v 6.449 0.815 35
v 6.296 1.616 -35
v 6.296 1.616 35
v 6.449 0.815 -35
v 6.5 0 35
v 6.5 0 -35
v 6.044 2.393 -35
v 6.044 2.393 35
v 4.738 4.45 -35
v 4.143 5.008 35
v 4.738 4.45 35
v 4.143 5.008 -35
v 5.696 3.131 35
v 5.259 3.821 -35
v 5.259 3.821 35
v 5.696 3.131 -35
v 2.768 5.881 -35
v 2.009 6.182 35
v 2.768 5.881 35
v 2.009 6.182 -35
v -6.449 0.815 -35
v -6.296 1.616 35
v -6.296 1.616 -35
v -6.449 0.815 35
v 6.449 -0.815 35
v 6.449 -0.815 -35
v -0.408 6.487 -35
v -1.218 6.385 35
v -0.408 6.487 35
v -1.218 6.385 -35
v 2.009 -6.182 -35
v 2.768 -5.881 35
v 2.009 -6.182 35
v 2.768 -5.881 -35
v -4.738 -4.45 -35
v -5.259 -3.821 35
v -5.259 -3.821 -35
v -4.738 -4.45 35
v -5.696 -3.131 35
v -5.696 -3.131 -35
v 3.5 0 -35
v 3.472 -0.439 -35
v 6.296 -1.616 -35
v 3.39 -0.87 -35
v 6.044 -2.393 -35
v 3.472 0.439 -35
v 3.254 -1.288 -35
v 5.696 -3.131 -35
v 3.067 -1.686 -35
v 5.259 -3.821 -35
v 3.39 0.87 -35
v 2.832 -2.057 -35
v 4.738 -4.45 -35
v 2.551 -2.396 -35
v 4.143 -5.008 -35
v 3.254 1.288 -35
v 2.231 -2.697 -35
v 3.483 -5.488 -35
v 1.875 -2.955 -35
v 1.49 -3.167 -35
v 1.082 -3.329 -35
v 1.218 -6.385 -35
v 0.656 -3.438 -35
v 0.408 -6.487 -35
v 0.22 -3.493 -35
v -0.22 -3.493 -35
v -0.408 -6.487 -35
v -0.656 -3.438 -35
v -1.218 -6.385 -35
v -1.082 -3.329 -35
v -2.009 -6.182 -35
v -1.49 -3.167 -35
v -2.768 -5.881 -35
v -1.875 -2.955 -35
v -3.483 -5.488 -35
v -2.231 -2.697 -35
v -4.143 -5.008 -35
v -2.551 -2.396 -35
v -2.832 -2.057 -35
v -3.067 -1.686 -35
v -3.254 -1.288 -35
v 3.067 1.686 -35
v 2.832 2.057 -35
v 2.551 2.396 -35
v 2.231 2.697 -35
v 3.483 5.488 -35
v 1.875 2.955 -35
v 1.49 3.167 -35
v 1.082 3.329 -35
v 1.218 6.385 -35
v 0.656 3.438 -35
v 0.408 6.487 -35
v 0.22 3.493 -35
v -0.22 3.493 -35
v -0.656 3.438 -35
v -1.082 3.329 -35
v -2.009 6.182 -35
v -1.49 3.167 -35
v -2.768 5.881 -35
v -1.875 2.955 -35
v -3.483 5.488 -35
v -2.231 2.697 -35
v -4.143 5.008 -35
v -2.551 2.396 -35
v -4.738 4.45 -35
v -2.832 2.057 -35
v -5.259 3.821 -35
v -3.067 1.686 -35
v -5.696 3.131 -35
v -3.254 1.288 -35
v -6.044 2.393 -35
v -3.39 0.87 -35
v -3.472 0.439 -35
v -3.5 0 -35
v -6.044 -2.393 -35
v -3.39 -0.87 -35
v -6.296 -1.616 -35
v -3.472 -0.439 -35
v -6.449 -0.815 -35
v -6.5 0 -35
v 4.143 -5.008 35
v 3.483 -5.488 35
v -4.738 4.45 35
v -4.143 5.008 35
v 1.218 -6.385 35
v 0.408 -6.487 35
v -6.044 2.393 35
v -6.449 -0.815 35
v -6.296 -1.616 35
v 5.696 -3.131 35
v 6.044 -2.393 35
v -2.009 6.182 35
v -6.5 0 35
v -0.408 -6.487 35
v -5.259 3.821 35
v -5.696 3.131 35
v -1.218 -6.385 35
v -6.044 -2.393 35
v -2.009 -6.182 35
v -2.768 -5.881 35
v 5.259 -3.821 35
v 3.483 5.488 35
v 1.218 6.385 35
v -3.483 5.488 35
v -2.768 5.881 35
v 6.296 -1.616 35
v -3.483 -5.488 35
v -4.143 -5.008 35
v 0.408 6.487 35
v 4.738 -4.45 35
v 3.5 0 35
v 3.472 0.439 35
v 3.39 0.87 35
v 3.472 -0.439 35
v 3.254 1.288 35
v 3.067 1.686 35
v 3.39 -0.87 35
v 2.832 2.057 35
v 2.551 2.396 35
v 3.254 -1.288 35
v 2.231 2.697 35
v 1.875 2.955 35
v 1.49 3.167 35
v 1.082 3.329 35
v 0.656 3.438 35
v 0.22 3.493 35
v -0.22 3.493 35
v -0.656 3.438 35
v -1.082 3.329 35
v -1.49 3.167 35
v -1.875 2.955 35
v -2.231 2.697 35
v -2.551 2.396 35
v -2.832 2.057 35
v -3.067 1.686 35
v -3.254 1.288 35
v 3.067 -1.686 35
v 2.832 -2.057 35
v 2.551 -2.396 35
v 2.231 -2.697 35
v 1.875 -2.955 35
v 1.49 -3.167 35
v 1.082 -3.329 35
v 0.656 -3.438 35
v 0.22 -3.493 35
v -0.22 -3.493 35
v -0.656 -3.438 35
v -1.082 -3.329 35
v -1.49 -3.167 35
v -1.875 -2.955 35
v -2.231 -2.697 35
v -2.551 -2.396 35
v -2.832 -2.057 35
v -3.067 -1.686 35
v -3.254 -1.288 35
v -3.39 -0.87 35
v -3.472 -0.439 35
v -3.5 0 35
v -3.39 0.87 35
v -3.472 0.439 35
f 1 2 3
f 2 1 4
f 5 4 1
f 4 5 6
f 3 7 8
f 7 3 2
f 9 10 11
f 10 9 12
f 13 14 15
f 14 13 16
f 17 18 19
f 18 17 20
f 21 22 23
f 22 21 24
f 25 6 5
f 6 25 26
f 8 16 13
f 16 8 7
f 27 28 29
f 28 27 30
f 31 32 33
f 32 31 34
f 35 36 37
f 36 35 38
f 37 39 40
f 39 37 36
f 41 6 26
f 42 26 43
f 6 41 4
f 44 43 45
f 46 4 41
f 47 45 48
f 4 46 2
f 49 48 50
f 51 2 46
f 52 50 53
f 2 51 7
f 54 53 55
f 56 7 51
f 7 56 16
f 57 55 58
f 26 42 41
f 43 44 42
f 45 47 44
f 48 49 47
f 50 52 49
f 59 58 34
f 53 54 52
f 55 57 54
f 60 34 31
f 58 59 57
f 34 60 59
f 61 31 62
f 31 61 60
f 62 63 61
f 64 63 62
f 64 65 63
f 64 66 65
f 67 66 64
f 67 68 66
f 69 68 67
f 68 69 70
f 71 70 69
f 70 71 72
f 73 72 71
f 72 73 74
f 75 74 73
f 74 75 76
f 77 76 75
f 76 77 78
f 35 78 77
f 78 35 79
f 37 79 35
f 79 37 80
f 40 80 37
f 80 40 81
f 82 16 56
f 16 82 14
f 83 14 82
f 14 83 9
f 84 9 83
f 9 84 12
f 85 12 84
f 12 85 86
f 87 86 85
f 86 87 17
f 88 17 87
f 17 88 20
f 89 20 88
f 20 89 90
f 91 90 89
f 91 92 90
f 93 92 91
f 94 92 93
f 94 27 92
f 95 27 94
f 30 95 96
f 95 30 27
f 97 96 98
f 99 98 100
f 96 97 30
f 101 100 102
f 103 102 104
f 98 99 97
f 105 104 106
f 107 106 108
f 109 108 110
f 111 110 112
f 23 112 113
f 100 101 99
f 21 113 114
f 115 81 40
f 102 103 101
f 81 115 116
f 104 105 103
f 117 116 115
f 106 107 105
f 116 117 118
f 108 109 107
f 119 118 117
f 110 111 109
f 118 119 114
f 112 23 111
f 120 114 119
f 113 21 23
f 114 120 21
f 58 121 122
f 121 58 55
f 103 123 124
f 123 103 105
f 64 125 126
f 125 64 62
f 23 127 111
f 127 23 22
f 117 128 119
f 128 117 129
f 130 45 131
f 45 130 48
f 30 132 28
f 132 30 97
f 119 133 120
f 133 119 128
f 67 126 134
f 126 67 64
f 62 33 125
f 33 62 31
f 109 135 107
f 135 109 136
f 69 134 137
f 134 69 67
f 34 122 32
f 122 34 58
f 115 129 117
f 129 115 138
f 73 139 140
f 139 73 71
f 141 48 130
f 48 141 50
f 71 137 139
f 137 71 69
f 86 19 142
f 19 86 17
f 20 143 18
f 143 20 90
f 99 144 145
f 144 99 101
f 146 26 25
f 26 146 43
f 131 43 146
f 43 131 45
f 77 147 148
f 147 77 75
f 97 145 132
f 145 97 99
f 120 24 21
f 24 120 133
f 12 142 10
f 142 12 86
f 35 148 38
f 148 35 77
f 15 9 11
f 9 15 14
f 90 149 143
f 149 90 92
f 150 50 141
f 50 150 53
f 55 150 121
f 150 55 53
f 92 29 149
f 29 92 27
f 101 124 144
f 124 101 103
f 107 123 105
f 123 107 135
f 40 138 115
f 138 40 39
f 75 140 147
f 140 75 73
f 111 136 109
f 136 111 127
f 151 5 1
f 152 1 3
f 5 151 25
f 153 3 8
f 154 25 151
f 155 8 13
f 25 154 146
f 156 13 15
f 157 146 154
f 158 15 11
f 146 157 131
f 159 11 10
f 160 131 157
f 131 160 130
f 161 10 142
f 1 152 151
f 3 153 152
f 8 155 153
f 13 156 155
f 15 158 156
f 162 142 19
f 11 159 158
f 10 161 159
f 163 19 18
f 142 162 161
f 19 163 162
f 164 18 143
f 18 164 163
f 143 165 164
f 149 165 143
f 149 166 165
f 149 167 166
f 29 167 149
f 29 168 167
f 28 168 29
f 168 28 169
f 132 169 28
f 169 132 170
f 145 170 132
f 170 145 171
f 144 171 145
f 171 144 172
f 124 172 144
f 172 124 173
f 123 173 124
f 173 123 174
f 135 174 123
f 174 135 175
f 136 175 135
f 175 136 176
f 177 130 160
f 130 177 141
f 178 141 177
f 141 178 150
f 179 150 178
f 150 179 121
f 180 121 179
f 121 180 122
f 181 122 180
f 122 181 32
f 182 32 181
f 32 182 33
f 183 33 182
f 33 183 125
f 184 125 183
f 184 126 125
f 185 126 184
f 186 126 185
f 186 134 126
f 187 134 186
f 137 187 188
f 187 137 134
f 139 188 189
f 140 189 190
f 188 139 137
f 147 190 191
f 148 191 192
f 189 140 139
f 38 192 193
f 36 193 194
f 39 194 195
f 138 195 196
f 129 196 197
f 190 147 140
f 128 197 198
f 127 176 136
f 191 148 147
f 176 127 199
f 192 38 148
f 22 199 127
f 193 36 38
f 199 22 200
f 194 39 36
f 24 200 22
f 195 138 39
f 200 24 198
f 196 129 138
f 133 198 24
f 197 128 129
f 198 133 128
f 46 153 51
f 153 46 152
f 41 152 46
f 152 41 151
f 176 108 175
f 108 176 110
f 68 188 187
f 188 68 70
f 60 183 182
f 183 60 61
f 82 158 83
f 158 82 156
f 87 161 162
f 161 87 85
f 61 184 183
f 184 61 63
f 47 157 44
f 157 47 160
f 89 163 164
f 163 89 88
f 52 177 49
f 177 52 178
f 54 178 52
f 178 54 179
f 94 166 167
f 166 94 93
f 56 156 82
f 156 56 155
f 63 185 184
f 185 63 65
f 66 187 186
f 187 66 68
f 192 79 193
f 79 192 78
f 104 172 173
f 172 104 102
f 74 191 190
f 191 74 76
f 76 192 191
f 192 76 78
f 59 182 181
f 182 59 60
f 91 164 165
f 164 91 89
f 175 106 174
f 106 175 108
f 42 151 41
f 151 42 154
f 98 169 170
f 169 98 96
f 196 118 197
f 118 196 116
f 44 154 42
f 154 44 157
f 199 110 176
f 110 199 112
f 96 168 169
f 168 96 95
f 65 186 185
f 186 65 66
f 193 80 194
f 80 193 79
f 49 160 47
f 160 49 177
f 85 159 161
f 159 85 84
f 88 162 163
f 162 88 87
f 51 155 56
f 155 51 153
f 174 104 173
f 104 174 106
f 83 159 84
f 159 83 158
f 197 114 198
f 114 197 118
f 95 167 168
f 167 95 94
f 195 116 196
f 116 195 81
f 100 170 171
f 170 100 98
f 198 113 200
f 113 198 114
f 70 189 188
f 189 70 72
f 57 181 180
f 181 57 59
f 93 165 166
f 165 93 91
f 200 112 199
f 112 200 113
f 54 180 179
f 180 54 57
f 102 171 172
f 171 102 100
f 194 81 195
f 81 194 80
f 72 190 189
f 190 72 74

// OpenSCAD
$fn = 50;


difference() {
	union() {
		translate(v = [0, 0, -35.0000000000]) {
			cylinder(h = 70, r = 6.5000000000);
		}
	}
	union() {
		translate(v = [0, 0, -100.0000000000]) {
			cylinder(h = 200, r = 3.5000000000);
		}
	}
}
